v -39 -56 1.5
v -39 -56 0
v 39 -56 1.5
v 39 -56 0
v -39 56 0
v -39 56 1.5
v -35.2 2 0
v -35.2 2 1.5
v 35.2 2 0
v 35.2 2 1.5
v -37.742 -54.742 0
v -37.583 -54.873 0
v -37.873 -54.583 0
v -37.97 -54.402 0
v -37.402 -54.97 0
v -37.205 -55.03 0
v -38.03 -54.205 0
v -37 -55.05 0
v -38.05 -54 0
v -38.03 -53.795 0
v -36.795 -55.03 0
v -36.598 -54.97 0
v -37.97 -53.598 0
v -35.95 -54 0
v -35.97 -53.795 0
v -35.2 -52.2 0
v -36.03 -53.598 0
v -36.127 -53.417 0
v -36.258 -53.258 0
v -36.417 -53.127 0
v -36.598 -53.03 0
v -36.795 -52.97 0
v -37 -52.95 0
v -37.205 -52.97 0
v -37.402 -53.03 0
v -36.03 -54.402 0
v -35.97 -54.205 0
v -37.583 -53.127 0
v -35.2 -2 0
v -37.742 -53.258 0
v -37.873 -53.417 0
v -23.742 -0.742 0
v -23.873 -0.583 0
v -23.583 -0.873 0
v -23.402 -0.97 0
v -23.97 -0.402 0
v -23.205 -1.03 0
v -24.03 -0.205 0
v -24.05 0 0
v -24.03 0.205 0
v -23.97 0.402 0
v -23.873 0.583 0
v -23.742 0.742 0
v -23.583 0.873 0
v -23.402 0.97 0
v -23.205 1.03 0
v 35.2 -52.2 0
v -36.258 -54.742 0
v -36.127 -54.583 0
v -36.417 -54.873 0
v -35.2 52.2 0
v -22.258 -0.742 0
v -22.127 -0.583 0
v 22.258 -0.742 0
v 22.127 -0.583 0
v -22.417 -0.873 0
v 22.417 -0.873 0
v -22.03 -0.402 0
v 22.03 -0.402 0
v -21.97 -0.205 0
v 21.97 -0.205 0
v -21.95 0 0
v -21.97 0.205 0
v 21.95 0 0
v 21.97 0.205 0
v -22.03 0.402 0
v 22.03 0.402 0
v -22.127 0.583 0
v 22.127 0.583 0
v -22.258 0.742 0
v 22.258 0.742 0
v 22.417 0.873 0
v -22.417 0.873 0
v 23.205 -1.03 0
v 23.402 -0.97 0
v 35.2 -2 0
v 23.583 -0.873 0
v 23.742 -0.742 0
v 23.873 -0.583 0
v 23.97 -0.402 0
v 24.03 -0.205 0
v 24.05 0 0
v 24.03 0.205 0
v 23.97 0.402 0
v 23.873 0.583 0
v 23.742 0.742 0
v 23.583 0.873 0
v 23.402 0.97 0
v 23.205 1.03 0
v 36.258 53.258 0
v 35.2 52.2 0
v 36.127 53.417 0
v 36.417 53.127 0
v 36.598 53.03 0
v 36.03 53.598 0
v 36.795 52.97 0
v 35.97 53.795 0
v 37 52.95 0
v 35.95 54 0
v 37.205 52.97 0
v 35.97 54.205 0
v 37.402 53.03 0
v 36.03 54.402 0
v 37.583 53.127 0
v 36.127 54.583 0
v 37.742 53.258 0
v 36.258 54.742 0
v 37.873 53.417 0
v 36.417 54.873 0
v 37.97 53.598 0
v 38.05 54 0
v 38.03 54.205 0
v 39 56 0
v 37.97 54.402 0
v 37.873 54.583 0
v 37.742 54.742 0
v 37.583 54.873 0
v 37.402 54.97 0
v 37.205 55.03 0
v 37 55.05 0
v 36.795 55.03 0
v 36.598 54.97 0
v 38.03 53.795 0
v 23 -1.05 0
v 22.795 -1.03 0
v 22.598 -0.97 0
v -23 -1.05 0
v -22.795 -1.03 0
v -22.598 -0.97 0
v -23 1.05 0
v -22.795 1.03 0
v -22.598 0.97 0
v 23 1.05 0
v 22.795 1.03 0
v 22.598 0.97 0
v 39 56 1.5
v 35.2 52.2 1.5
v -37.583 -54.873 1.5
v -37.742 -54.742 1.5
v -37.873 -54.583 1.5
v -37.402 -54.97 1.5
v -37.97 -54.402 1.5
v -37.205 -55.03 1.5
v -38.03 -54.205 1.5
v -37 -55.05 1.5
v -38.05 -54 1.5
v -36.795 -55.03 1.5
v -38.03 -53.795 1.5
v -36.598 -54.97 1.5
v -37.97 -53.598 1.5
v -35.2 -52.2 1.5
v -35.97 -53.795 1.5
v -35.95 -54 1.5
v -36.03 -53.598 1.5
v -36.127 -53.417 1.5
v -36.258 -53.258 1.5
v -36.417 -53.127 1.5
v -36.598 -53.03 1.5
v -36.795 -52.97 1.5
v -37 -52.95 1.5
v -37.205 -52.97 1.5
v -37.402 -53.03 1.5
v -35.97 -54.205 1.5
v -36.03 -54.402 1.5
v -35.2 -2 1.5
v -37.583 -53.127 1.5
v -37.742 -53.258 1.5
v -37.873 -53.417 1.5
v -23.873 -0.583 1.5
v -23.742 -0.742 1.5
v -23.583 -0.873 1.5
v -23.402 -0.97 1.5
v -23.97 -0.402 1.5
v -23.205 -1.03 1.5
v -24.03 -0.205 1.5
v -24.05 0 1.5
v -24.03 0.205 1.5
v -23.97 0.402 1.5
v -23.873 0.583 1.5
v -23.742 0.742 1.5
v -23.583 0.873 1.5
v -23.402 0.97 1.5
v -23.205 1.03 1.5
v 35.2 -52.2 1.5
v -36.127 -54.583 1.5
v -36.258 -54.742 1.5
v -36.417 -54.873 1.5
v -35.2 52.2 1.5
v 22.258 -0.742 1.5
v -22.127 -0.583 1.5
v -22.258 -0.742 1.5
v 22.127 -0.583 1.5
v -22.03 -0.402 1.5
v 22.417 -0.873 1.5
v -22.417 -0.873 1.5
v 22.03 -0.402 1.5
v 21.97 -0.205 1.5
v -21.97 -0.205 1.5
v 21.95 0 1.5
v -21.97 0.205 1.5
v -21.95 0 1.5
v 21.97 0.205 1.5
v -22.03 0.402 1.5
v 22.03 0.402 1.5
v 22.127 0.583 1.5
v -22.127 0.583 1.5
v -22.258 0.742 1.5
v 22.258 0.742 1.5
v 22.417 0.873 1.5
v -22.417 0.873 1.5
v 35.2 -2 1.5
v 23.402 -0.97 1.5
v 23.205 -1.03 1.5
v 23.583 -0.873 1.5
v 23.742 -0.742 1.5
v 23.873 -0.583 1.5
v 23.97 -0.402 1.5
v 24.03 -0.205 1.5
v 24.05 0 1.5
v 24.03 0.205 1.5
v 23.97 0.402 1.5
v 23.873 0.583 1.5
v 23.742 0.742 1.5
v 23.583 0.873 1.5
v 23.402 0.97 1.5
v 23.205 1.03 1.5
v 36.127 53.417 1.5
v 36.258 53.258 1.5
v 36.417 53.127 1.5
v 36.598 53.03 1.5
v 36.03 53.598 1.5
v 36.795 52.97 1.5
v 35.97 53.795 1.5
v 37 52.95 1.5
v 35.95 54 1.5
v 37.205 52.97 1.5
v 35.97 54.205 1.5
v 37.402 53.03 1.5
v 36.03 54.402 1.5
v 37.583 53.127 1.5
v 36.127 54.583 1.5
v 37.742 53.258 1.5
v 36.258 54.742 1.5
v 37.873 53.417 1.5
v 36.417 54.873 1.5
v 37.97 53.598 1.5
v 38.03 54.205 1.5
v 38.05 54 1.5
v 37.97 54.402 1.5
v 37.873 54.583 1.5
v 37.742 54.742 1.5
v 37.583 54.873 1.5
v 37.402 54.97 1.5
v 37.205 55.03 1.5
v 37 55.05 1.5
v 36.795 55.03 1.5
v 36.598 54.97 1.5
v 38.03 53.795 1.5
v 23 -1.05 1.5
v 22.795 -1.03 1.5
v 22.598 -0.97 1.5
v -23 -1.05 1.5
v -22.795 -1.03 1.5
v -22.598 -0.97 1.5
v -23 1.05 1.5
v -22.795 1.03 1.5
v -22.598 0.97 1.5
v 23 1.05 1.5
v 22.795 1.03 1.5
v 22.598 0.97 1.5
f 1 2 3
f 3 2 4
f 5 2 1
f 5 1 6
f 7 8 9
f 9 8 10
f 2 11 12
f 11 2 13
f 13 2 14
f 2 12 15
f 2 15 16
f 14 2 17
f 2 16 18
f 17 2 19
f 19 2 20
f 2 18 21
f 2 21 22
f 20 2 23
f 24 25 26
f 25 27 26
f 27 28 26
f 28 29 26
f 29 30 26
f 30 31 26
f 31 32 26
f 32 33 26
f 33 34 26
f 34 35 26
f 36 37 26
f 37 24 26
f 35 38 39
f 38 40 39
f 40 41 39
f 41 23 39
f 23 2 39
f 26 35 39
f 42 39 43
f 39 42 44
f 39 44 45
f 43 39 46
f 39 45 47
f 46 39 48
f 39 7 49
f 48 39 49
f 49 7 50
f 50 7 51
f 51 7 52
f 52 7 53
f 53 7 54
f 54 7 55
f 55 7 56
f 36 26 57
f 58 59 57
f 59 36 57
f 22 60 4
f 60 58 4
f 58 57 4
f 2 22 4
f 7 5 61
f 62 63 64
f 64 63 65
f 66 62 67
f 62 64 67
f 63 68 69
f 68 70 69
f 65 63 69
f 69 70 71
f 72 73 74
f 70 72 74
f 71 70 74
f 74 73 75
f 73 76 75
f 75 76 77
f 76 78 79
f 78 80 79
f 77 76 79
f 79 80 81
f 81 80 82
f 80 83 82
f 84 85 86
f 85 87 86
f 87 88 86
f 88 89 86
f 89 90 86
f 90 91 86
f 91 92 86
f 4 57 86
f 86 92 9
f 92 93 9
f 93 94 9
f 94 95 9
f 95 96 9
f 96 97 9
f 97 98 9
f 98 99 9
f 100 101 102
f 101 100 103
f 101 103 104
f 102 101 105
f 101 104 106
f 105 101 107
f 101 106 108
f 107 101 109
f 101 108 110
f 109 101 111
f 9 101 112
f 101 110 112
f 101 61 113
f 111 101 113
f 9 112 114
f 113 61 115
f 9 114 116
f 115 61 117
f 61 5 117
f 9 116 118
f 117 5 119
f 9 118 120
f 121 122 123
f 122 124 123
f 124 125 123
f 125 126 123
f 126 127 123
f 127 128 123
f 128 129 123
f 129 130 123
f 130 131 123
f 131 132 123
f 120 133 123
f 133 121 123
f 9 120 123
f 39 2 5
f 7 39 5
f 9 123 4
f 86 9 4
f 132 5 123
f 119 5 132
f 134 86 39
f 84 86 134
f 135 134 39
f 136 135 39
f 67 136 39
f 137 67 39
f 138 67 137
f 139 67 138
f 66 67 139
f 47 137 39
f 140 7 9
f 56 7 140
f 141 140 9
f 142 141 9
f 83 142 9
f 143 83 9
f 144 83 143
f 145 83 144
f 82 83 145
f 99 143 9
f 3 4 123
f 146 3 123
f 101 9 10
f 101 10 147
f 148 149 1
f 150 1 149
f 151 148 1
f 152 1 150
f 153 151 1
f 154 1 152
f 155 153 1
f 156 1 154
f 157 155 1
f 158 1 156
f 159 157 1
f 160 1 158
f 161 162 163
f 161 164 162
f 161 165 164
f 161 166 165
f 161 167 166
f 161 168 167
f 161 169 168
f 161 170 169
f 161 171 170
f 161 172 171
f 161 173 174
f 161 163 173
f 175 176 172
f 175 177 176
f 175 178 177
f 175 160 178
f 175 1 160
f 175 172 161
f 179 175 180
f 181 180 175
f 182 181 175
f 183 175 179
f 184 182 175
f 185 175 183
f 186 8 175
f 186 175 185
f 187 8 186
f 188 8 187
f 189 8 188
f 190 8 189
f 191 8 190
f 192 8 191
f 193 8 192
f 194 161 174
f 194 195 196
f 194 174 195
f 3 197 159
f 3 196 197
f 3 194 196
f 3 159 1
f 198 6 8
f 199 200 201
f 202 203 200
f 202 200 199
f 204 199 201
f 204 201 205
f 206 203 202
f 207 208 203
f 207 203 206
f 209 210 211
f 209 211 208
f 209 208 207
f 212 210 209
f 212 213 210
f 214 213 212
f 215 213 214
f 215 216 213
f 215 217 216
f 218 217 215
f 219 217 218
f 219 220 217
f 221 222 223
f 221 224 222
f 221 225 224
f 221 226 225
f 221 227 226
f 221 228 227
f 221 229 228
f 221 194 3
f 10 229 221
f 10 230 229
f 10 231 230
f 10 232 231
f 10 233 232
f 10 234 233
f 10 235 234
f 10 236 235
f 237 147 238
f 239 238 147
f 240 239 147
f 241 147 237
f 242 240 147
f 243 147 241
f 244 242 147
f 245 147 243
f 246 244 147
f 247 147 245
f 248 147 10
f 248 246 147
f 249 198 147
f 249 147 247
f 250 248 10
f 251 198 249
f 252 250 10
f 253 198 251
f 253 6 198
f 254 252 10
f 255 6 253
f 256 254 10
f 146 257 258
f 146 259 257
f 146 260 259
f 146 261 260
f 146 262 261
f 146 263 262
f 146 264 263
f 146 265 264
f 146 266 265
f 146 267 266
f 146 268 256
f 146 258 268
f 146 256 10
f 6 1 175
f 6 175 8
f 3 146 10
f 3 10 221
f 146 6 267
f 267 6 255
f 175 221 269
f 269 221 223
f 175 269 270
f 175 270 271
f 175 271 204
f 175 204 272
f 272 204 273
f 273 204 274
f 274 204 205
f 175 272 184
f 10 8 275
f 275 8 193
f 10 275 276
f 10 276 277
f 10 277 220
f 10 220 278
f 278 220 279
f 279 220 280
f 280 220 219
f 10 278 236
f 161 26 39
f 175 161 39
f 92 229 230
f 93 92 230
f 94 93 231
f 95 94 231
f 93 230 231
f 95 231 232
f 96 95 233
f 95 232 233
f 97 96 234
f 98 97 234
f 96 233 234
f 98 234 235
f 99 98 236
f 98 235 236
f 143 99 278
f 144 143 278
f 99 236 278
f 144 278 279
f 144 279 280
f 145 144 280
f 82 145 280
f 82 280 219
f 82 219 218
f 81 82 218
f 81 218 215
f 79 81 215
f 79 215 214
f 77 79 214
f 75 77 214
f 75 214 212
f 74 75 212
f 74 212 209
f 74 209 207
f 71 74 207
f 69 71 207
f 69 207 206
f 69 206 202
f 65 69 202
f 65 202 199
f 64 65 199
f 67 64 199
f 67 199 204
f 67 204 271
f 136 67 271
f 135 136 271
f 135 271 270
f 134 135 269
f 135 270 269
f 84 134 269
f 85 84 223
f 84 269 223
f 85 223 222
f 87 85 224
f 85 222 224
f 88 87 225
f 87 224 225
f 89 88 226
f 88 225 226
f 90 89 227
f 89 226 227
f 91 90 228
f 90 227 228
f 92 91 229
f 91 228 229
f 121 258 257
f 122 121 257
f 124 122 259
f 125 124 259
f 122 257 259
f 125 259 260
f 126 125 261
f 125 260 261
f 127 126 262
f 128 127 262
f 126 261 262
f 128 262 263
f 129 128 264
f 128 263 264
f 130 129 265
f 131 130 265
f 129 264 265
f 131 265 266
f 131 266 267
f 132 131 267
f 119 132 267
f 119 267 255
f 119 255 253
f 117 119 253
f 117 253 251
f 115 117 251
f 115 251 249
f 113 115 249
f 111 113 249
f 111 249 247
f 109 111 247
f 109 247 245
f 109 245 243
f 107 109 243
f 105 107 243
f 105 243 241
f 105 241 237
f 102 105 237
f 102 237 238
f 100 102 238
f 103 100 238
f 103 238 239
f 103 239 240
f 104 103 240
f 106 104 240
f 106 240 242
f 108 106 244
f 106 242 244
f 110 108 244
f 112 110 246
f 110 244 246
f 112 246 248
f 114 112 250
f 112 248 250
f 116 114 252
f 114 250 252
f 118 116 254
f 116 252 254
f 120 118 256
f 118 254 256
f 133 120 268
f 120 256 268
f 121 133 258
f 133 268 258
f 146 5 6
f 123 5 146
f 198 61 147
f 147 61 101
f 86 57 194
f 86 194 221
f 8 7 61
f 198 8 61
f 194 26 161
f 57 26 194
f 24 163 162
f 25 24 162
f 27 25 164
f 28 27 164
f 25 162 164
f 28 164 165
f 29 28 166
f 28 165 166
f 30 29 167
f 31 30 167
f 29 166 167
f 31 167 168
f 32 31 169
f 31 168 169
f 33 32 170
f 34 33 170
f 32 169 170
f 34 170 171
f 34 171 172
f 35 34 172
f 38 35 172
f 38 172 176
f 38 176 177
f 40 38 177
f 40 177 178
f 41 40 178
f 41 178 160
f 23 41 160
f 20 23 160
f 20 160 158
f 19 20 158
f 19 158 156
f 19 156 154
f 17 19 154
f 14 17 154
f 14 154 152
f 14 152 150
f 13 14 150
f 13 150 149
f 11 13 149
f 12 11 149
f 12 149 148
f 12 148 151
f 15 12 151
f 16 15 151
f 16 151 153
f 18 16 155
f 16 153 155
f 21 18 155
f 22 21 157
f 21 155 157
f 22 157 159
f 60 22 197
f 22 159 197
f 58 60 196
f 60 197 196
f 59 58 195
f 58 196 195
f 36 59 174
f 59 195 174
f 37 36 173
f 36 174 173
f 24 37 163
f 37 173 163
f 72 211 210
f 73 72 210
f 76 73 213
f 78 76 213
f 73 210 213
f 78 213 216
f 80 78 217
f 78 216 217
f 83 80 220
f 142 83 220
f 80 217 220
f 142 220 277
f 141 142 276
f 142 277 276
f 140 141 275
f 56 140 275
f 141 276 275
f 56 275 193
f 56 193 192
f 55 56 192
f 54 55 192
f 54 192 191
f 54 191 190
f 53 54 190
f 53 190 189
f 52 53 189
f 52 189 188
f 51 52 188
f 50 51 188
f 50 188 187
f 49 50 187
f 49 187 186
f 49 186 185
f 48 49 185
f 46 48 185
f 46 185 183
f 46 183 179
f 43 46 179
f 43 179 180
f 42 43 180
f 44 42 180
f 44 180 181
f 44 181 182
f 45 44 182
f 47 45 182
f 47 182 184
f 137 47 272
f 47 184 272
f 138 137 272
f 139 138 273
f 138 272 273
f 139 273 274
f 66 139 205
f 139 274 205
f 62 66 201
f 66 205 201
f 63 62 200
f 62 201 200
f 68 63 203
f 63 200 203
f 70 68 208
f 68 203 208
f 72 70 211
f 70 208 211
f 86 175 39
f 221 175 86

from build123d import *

# Parameters (mm, degrees)
SKETCH1_W           = 78
SKETCH1_H           = 112
SKETCH1_W_2         = 70.4
SKETCH1_H_2         = 104.4
BOSS_EXTRUDE1_DEPTH = 1.5
SKETCH2_W           = 70.4
SKETCH2_H           = 4
BOSS_EXTRUDE3_DEPTH = 1.5
SKETCH4_R           = 1.05
CUT_EXTRUDE1_DEPTH  = 2.5


with BuildPart() as part:
    # Sketch1 → Boss-Extrude1 (new body)
    with BuildSketch(Plane.XY):
        Rectangle(SKETCH1_W, SKETCH1_H)
        Rectangle(SKETCH1_W_2, SKETCH1_H_2, mode=Mode.SUBTRACT)
    extrude(amount=BOSS_EXTRUDE1_DEPTH)

    # Sketch2 → Boss-Extrude3 (add)
    with BuildSketch(Plane.XY.offset(1.5)):
        Rectangle(SKETCH2_W, SKETCH2_H)
    extrude(amount=-BOSS_EXTRUDE3_DEPTH)

    # Sketch4 → Cut-Extrude1 (cut, through all)
    with BuildSketch(Plane.XY.offset(1.5)):
        with Locations((37, 54)):
            Circle(SKETCH4_R)
        with Locations((23, 0)):
            Circle(SKETCH4_R)
        with Locations((-23, 0)):
            Circle(SKETCH4_R)
        with Locations((-37, -54)):
            Circle(SKETCH4_R)
    extrude(amount=-CUT_EXTRUDE1_DEPTH, mode=Mode.SUBTRACT)


solid = part.part
